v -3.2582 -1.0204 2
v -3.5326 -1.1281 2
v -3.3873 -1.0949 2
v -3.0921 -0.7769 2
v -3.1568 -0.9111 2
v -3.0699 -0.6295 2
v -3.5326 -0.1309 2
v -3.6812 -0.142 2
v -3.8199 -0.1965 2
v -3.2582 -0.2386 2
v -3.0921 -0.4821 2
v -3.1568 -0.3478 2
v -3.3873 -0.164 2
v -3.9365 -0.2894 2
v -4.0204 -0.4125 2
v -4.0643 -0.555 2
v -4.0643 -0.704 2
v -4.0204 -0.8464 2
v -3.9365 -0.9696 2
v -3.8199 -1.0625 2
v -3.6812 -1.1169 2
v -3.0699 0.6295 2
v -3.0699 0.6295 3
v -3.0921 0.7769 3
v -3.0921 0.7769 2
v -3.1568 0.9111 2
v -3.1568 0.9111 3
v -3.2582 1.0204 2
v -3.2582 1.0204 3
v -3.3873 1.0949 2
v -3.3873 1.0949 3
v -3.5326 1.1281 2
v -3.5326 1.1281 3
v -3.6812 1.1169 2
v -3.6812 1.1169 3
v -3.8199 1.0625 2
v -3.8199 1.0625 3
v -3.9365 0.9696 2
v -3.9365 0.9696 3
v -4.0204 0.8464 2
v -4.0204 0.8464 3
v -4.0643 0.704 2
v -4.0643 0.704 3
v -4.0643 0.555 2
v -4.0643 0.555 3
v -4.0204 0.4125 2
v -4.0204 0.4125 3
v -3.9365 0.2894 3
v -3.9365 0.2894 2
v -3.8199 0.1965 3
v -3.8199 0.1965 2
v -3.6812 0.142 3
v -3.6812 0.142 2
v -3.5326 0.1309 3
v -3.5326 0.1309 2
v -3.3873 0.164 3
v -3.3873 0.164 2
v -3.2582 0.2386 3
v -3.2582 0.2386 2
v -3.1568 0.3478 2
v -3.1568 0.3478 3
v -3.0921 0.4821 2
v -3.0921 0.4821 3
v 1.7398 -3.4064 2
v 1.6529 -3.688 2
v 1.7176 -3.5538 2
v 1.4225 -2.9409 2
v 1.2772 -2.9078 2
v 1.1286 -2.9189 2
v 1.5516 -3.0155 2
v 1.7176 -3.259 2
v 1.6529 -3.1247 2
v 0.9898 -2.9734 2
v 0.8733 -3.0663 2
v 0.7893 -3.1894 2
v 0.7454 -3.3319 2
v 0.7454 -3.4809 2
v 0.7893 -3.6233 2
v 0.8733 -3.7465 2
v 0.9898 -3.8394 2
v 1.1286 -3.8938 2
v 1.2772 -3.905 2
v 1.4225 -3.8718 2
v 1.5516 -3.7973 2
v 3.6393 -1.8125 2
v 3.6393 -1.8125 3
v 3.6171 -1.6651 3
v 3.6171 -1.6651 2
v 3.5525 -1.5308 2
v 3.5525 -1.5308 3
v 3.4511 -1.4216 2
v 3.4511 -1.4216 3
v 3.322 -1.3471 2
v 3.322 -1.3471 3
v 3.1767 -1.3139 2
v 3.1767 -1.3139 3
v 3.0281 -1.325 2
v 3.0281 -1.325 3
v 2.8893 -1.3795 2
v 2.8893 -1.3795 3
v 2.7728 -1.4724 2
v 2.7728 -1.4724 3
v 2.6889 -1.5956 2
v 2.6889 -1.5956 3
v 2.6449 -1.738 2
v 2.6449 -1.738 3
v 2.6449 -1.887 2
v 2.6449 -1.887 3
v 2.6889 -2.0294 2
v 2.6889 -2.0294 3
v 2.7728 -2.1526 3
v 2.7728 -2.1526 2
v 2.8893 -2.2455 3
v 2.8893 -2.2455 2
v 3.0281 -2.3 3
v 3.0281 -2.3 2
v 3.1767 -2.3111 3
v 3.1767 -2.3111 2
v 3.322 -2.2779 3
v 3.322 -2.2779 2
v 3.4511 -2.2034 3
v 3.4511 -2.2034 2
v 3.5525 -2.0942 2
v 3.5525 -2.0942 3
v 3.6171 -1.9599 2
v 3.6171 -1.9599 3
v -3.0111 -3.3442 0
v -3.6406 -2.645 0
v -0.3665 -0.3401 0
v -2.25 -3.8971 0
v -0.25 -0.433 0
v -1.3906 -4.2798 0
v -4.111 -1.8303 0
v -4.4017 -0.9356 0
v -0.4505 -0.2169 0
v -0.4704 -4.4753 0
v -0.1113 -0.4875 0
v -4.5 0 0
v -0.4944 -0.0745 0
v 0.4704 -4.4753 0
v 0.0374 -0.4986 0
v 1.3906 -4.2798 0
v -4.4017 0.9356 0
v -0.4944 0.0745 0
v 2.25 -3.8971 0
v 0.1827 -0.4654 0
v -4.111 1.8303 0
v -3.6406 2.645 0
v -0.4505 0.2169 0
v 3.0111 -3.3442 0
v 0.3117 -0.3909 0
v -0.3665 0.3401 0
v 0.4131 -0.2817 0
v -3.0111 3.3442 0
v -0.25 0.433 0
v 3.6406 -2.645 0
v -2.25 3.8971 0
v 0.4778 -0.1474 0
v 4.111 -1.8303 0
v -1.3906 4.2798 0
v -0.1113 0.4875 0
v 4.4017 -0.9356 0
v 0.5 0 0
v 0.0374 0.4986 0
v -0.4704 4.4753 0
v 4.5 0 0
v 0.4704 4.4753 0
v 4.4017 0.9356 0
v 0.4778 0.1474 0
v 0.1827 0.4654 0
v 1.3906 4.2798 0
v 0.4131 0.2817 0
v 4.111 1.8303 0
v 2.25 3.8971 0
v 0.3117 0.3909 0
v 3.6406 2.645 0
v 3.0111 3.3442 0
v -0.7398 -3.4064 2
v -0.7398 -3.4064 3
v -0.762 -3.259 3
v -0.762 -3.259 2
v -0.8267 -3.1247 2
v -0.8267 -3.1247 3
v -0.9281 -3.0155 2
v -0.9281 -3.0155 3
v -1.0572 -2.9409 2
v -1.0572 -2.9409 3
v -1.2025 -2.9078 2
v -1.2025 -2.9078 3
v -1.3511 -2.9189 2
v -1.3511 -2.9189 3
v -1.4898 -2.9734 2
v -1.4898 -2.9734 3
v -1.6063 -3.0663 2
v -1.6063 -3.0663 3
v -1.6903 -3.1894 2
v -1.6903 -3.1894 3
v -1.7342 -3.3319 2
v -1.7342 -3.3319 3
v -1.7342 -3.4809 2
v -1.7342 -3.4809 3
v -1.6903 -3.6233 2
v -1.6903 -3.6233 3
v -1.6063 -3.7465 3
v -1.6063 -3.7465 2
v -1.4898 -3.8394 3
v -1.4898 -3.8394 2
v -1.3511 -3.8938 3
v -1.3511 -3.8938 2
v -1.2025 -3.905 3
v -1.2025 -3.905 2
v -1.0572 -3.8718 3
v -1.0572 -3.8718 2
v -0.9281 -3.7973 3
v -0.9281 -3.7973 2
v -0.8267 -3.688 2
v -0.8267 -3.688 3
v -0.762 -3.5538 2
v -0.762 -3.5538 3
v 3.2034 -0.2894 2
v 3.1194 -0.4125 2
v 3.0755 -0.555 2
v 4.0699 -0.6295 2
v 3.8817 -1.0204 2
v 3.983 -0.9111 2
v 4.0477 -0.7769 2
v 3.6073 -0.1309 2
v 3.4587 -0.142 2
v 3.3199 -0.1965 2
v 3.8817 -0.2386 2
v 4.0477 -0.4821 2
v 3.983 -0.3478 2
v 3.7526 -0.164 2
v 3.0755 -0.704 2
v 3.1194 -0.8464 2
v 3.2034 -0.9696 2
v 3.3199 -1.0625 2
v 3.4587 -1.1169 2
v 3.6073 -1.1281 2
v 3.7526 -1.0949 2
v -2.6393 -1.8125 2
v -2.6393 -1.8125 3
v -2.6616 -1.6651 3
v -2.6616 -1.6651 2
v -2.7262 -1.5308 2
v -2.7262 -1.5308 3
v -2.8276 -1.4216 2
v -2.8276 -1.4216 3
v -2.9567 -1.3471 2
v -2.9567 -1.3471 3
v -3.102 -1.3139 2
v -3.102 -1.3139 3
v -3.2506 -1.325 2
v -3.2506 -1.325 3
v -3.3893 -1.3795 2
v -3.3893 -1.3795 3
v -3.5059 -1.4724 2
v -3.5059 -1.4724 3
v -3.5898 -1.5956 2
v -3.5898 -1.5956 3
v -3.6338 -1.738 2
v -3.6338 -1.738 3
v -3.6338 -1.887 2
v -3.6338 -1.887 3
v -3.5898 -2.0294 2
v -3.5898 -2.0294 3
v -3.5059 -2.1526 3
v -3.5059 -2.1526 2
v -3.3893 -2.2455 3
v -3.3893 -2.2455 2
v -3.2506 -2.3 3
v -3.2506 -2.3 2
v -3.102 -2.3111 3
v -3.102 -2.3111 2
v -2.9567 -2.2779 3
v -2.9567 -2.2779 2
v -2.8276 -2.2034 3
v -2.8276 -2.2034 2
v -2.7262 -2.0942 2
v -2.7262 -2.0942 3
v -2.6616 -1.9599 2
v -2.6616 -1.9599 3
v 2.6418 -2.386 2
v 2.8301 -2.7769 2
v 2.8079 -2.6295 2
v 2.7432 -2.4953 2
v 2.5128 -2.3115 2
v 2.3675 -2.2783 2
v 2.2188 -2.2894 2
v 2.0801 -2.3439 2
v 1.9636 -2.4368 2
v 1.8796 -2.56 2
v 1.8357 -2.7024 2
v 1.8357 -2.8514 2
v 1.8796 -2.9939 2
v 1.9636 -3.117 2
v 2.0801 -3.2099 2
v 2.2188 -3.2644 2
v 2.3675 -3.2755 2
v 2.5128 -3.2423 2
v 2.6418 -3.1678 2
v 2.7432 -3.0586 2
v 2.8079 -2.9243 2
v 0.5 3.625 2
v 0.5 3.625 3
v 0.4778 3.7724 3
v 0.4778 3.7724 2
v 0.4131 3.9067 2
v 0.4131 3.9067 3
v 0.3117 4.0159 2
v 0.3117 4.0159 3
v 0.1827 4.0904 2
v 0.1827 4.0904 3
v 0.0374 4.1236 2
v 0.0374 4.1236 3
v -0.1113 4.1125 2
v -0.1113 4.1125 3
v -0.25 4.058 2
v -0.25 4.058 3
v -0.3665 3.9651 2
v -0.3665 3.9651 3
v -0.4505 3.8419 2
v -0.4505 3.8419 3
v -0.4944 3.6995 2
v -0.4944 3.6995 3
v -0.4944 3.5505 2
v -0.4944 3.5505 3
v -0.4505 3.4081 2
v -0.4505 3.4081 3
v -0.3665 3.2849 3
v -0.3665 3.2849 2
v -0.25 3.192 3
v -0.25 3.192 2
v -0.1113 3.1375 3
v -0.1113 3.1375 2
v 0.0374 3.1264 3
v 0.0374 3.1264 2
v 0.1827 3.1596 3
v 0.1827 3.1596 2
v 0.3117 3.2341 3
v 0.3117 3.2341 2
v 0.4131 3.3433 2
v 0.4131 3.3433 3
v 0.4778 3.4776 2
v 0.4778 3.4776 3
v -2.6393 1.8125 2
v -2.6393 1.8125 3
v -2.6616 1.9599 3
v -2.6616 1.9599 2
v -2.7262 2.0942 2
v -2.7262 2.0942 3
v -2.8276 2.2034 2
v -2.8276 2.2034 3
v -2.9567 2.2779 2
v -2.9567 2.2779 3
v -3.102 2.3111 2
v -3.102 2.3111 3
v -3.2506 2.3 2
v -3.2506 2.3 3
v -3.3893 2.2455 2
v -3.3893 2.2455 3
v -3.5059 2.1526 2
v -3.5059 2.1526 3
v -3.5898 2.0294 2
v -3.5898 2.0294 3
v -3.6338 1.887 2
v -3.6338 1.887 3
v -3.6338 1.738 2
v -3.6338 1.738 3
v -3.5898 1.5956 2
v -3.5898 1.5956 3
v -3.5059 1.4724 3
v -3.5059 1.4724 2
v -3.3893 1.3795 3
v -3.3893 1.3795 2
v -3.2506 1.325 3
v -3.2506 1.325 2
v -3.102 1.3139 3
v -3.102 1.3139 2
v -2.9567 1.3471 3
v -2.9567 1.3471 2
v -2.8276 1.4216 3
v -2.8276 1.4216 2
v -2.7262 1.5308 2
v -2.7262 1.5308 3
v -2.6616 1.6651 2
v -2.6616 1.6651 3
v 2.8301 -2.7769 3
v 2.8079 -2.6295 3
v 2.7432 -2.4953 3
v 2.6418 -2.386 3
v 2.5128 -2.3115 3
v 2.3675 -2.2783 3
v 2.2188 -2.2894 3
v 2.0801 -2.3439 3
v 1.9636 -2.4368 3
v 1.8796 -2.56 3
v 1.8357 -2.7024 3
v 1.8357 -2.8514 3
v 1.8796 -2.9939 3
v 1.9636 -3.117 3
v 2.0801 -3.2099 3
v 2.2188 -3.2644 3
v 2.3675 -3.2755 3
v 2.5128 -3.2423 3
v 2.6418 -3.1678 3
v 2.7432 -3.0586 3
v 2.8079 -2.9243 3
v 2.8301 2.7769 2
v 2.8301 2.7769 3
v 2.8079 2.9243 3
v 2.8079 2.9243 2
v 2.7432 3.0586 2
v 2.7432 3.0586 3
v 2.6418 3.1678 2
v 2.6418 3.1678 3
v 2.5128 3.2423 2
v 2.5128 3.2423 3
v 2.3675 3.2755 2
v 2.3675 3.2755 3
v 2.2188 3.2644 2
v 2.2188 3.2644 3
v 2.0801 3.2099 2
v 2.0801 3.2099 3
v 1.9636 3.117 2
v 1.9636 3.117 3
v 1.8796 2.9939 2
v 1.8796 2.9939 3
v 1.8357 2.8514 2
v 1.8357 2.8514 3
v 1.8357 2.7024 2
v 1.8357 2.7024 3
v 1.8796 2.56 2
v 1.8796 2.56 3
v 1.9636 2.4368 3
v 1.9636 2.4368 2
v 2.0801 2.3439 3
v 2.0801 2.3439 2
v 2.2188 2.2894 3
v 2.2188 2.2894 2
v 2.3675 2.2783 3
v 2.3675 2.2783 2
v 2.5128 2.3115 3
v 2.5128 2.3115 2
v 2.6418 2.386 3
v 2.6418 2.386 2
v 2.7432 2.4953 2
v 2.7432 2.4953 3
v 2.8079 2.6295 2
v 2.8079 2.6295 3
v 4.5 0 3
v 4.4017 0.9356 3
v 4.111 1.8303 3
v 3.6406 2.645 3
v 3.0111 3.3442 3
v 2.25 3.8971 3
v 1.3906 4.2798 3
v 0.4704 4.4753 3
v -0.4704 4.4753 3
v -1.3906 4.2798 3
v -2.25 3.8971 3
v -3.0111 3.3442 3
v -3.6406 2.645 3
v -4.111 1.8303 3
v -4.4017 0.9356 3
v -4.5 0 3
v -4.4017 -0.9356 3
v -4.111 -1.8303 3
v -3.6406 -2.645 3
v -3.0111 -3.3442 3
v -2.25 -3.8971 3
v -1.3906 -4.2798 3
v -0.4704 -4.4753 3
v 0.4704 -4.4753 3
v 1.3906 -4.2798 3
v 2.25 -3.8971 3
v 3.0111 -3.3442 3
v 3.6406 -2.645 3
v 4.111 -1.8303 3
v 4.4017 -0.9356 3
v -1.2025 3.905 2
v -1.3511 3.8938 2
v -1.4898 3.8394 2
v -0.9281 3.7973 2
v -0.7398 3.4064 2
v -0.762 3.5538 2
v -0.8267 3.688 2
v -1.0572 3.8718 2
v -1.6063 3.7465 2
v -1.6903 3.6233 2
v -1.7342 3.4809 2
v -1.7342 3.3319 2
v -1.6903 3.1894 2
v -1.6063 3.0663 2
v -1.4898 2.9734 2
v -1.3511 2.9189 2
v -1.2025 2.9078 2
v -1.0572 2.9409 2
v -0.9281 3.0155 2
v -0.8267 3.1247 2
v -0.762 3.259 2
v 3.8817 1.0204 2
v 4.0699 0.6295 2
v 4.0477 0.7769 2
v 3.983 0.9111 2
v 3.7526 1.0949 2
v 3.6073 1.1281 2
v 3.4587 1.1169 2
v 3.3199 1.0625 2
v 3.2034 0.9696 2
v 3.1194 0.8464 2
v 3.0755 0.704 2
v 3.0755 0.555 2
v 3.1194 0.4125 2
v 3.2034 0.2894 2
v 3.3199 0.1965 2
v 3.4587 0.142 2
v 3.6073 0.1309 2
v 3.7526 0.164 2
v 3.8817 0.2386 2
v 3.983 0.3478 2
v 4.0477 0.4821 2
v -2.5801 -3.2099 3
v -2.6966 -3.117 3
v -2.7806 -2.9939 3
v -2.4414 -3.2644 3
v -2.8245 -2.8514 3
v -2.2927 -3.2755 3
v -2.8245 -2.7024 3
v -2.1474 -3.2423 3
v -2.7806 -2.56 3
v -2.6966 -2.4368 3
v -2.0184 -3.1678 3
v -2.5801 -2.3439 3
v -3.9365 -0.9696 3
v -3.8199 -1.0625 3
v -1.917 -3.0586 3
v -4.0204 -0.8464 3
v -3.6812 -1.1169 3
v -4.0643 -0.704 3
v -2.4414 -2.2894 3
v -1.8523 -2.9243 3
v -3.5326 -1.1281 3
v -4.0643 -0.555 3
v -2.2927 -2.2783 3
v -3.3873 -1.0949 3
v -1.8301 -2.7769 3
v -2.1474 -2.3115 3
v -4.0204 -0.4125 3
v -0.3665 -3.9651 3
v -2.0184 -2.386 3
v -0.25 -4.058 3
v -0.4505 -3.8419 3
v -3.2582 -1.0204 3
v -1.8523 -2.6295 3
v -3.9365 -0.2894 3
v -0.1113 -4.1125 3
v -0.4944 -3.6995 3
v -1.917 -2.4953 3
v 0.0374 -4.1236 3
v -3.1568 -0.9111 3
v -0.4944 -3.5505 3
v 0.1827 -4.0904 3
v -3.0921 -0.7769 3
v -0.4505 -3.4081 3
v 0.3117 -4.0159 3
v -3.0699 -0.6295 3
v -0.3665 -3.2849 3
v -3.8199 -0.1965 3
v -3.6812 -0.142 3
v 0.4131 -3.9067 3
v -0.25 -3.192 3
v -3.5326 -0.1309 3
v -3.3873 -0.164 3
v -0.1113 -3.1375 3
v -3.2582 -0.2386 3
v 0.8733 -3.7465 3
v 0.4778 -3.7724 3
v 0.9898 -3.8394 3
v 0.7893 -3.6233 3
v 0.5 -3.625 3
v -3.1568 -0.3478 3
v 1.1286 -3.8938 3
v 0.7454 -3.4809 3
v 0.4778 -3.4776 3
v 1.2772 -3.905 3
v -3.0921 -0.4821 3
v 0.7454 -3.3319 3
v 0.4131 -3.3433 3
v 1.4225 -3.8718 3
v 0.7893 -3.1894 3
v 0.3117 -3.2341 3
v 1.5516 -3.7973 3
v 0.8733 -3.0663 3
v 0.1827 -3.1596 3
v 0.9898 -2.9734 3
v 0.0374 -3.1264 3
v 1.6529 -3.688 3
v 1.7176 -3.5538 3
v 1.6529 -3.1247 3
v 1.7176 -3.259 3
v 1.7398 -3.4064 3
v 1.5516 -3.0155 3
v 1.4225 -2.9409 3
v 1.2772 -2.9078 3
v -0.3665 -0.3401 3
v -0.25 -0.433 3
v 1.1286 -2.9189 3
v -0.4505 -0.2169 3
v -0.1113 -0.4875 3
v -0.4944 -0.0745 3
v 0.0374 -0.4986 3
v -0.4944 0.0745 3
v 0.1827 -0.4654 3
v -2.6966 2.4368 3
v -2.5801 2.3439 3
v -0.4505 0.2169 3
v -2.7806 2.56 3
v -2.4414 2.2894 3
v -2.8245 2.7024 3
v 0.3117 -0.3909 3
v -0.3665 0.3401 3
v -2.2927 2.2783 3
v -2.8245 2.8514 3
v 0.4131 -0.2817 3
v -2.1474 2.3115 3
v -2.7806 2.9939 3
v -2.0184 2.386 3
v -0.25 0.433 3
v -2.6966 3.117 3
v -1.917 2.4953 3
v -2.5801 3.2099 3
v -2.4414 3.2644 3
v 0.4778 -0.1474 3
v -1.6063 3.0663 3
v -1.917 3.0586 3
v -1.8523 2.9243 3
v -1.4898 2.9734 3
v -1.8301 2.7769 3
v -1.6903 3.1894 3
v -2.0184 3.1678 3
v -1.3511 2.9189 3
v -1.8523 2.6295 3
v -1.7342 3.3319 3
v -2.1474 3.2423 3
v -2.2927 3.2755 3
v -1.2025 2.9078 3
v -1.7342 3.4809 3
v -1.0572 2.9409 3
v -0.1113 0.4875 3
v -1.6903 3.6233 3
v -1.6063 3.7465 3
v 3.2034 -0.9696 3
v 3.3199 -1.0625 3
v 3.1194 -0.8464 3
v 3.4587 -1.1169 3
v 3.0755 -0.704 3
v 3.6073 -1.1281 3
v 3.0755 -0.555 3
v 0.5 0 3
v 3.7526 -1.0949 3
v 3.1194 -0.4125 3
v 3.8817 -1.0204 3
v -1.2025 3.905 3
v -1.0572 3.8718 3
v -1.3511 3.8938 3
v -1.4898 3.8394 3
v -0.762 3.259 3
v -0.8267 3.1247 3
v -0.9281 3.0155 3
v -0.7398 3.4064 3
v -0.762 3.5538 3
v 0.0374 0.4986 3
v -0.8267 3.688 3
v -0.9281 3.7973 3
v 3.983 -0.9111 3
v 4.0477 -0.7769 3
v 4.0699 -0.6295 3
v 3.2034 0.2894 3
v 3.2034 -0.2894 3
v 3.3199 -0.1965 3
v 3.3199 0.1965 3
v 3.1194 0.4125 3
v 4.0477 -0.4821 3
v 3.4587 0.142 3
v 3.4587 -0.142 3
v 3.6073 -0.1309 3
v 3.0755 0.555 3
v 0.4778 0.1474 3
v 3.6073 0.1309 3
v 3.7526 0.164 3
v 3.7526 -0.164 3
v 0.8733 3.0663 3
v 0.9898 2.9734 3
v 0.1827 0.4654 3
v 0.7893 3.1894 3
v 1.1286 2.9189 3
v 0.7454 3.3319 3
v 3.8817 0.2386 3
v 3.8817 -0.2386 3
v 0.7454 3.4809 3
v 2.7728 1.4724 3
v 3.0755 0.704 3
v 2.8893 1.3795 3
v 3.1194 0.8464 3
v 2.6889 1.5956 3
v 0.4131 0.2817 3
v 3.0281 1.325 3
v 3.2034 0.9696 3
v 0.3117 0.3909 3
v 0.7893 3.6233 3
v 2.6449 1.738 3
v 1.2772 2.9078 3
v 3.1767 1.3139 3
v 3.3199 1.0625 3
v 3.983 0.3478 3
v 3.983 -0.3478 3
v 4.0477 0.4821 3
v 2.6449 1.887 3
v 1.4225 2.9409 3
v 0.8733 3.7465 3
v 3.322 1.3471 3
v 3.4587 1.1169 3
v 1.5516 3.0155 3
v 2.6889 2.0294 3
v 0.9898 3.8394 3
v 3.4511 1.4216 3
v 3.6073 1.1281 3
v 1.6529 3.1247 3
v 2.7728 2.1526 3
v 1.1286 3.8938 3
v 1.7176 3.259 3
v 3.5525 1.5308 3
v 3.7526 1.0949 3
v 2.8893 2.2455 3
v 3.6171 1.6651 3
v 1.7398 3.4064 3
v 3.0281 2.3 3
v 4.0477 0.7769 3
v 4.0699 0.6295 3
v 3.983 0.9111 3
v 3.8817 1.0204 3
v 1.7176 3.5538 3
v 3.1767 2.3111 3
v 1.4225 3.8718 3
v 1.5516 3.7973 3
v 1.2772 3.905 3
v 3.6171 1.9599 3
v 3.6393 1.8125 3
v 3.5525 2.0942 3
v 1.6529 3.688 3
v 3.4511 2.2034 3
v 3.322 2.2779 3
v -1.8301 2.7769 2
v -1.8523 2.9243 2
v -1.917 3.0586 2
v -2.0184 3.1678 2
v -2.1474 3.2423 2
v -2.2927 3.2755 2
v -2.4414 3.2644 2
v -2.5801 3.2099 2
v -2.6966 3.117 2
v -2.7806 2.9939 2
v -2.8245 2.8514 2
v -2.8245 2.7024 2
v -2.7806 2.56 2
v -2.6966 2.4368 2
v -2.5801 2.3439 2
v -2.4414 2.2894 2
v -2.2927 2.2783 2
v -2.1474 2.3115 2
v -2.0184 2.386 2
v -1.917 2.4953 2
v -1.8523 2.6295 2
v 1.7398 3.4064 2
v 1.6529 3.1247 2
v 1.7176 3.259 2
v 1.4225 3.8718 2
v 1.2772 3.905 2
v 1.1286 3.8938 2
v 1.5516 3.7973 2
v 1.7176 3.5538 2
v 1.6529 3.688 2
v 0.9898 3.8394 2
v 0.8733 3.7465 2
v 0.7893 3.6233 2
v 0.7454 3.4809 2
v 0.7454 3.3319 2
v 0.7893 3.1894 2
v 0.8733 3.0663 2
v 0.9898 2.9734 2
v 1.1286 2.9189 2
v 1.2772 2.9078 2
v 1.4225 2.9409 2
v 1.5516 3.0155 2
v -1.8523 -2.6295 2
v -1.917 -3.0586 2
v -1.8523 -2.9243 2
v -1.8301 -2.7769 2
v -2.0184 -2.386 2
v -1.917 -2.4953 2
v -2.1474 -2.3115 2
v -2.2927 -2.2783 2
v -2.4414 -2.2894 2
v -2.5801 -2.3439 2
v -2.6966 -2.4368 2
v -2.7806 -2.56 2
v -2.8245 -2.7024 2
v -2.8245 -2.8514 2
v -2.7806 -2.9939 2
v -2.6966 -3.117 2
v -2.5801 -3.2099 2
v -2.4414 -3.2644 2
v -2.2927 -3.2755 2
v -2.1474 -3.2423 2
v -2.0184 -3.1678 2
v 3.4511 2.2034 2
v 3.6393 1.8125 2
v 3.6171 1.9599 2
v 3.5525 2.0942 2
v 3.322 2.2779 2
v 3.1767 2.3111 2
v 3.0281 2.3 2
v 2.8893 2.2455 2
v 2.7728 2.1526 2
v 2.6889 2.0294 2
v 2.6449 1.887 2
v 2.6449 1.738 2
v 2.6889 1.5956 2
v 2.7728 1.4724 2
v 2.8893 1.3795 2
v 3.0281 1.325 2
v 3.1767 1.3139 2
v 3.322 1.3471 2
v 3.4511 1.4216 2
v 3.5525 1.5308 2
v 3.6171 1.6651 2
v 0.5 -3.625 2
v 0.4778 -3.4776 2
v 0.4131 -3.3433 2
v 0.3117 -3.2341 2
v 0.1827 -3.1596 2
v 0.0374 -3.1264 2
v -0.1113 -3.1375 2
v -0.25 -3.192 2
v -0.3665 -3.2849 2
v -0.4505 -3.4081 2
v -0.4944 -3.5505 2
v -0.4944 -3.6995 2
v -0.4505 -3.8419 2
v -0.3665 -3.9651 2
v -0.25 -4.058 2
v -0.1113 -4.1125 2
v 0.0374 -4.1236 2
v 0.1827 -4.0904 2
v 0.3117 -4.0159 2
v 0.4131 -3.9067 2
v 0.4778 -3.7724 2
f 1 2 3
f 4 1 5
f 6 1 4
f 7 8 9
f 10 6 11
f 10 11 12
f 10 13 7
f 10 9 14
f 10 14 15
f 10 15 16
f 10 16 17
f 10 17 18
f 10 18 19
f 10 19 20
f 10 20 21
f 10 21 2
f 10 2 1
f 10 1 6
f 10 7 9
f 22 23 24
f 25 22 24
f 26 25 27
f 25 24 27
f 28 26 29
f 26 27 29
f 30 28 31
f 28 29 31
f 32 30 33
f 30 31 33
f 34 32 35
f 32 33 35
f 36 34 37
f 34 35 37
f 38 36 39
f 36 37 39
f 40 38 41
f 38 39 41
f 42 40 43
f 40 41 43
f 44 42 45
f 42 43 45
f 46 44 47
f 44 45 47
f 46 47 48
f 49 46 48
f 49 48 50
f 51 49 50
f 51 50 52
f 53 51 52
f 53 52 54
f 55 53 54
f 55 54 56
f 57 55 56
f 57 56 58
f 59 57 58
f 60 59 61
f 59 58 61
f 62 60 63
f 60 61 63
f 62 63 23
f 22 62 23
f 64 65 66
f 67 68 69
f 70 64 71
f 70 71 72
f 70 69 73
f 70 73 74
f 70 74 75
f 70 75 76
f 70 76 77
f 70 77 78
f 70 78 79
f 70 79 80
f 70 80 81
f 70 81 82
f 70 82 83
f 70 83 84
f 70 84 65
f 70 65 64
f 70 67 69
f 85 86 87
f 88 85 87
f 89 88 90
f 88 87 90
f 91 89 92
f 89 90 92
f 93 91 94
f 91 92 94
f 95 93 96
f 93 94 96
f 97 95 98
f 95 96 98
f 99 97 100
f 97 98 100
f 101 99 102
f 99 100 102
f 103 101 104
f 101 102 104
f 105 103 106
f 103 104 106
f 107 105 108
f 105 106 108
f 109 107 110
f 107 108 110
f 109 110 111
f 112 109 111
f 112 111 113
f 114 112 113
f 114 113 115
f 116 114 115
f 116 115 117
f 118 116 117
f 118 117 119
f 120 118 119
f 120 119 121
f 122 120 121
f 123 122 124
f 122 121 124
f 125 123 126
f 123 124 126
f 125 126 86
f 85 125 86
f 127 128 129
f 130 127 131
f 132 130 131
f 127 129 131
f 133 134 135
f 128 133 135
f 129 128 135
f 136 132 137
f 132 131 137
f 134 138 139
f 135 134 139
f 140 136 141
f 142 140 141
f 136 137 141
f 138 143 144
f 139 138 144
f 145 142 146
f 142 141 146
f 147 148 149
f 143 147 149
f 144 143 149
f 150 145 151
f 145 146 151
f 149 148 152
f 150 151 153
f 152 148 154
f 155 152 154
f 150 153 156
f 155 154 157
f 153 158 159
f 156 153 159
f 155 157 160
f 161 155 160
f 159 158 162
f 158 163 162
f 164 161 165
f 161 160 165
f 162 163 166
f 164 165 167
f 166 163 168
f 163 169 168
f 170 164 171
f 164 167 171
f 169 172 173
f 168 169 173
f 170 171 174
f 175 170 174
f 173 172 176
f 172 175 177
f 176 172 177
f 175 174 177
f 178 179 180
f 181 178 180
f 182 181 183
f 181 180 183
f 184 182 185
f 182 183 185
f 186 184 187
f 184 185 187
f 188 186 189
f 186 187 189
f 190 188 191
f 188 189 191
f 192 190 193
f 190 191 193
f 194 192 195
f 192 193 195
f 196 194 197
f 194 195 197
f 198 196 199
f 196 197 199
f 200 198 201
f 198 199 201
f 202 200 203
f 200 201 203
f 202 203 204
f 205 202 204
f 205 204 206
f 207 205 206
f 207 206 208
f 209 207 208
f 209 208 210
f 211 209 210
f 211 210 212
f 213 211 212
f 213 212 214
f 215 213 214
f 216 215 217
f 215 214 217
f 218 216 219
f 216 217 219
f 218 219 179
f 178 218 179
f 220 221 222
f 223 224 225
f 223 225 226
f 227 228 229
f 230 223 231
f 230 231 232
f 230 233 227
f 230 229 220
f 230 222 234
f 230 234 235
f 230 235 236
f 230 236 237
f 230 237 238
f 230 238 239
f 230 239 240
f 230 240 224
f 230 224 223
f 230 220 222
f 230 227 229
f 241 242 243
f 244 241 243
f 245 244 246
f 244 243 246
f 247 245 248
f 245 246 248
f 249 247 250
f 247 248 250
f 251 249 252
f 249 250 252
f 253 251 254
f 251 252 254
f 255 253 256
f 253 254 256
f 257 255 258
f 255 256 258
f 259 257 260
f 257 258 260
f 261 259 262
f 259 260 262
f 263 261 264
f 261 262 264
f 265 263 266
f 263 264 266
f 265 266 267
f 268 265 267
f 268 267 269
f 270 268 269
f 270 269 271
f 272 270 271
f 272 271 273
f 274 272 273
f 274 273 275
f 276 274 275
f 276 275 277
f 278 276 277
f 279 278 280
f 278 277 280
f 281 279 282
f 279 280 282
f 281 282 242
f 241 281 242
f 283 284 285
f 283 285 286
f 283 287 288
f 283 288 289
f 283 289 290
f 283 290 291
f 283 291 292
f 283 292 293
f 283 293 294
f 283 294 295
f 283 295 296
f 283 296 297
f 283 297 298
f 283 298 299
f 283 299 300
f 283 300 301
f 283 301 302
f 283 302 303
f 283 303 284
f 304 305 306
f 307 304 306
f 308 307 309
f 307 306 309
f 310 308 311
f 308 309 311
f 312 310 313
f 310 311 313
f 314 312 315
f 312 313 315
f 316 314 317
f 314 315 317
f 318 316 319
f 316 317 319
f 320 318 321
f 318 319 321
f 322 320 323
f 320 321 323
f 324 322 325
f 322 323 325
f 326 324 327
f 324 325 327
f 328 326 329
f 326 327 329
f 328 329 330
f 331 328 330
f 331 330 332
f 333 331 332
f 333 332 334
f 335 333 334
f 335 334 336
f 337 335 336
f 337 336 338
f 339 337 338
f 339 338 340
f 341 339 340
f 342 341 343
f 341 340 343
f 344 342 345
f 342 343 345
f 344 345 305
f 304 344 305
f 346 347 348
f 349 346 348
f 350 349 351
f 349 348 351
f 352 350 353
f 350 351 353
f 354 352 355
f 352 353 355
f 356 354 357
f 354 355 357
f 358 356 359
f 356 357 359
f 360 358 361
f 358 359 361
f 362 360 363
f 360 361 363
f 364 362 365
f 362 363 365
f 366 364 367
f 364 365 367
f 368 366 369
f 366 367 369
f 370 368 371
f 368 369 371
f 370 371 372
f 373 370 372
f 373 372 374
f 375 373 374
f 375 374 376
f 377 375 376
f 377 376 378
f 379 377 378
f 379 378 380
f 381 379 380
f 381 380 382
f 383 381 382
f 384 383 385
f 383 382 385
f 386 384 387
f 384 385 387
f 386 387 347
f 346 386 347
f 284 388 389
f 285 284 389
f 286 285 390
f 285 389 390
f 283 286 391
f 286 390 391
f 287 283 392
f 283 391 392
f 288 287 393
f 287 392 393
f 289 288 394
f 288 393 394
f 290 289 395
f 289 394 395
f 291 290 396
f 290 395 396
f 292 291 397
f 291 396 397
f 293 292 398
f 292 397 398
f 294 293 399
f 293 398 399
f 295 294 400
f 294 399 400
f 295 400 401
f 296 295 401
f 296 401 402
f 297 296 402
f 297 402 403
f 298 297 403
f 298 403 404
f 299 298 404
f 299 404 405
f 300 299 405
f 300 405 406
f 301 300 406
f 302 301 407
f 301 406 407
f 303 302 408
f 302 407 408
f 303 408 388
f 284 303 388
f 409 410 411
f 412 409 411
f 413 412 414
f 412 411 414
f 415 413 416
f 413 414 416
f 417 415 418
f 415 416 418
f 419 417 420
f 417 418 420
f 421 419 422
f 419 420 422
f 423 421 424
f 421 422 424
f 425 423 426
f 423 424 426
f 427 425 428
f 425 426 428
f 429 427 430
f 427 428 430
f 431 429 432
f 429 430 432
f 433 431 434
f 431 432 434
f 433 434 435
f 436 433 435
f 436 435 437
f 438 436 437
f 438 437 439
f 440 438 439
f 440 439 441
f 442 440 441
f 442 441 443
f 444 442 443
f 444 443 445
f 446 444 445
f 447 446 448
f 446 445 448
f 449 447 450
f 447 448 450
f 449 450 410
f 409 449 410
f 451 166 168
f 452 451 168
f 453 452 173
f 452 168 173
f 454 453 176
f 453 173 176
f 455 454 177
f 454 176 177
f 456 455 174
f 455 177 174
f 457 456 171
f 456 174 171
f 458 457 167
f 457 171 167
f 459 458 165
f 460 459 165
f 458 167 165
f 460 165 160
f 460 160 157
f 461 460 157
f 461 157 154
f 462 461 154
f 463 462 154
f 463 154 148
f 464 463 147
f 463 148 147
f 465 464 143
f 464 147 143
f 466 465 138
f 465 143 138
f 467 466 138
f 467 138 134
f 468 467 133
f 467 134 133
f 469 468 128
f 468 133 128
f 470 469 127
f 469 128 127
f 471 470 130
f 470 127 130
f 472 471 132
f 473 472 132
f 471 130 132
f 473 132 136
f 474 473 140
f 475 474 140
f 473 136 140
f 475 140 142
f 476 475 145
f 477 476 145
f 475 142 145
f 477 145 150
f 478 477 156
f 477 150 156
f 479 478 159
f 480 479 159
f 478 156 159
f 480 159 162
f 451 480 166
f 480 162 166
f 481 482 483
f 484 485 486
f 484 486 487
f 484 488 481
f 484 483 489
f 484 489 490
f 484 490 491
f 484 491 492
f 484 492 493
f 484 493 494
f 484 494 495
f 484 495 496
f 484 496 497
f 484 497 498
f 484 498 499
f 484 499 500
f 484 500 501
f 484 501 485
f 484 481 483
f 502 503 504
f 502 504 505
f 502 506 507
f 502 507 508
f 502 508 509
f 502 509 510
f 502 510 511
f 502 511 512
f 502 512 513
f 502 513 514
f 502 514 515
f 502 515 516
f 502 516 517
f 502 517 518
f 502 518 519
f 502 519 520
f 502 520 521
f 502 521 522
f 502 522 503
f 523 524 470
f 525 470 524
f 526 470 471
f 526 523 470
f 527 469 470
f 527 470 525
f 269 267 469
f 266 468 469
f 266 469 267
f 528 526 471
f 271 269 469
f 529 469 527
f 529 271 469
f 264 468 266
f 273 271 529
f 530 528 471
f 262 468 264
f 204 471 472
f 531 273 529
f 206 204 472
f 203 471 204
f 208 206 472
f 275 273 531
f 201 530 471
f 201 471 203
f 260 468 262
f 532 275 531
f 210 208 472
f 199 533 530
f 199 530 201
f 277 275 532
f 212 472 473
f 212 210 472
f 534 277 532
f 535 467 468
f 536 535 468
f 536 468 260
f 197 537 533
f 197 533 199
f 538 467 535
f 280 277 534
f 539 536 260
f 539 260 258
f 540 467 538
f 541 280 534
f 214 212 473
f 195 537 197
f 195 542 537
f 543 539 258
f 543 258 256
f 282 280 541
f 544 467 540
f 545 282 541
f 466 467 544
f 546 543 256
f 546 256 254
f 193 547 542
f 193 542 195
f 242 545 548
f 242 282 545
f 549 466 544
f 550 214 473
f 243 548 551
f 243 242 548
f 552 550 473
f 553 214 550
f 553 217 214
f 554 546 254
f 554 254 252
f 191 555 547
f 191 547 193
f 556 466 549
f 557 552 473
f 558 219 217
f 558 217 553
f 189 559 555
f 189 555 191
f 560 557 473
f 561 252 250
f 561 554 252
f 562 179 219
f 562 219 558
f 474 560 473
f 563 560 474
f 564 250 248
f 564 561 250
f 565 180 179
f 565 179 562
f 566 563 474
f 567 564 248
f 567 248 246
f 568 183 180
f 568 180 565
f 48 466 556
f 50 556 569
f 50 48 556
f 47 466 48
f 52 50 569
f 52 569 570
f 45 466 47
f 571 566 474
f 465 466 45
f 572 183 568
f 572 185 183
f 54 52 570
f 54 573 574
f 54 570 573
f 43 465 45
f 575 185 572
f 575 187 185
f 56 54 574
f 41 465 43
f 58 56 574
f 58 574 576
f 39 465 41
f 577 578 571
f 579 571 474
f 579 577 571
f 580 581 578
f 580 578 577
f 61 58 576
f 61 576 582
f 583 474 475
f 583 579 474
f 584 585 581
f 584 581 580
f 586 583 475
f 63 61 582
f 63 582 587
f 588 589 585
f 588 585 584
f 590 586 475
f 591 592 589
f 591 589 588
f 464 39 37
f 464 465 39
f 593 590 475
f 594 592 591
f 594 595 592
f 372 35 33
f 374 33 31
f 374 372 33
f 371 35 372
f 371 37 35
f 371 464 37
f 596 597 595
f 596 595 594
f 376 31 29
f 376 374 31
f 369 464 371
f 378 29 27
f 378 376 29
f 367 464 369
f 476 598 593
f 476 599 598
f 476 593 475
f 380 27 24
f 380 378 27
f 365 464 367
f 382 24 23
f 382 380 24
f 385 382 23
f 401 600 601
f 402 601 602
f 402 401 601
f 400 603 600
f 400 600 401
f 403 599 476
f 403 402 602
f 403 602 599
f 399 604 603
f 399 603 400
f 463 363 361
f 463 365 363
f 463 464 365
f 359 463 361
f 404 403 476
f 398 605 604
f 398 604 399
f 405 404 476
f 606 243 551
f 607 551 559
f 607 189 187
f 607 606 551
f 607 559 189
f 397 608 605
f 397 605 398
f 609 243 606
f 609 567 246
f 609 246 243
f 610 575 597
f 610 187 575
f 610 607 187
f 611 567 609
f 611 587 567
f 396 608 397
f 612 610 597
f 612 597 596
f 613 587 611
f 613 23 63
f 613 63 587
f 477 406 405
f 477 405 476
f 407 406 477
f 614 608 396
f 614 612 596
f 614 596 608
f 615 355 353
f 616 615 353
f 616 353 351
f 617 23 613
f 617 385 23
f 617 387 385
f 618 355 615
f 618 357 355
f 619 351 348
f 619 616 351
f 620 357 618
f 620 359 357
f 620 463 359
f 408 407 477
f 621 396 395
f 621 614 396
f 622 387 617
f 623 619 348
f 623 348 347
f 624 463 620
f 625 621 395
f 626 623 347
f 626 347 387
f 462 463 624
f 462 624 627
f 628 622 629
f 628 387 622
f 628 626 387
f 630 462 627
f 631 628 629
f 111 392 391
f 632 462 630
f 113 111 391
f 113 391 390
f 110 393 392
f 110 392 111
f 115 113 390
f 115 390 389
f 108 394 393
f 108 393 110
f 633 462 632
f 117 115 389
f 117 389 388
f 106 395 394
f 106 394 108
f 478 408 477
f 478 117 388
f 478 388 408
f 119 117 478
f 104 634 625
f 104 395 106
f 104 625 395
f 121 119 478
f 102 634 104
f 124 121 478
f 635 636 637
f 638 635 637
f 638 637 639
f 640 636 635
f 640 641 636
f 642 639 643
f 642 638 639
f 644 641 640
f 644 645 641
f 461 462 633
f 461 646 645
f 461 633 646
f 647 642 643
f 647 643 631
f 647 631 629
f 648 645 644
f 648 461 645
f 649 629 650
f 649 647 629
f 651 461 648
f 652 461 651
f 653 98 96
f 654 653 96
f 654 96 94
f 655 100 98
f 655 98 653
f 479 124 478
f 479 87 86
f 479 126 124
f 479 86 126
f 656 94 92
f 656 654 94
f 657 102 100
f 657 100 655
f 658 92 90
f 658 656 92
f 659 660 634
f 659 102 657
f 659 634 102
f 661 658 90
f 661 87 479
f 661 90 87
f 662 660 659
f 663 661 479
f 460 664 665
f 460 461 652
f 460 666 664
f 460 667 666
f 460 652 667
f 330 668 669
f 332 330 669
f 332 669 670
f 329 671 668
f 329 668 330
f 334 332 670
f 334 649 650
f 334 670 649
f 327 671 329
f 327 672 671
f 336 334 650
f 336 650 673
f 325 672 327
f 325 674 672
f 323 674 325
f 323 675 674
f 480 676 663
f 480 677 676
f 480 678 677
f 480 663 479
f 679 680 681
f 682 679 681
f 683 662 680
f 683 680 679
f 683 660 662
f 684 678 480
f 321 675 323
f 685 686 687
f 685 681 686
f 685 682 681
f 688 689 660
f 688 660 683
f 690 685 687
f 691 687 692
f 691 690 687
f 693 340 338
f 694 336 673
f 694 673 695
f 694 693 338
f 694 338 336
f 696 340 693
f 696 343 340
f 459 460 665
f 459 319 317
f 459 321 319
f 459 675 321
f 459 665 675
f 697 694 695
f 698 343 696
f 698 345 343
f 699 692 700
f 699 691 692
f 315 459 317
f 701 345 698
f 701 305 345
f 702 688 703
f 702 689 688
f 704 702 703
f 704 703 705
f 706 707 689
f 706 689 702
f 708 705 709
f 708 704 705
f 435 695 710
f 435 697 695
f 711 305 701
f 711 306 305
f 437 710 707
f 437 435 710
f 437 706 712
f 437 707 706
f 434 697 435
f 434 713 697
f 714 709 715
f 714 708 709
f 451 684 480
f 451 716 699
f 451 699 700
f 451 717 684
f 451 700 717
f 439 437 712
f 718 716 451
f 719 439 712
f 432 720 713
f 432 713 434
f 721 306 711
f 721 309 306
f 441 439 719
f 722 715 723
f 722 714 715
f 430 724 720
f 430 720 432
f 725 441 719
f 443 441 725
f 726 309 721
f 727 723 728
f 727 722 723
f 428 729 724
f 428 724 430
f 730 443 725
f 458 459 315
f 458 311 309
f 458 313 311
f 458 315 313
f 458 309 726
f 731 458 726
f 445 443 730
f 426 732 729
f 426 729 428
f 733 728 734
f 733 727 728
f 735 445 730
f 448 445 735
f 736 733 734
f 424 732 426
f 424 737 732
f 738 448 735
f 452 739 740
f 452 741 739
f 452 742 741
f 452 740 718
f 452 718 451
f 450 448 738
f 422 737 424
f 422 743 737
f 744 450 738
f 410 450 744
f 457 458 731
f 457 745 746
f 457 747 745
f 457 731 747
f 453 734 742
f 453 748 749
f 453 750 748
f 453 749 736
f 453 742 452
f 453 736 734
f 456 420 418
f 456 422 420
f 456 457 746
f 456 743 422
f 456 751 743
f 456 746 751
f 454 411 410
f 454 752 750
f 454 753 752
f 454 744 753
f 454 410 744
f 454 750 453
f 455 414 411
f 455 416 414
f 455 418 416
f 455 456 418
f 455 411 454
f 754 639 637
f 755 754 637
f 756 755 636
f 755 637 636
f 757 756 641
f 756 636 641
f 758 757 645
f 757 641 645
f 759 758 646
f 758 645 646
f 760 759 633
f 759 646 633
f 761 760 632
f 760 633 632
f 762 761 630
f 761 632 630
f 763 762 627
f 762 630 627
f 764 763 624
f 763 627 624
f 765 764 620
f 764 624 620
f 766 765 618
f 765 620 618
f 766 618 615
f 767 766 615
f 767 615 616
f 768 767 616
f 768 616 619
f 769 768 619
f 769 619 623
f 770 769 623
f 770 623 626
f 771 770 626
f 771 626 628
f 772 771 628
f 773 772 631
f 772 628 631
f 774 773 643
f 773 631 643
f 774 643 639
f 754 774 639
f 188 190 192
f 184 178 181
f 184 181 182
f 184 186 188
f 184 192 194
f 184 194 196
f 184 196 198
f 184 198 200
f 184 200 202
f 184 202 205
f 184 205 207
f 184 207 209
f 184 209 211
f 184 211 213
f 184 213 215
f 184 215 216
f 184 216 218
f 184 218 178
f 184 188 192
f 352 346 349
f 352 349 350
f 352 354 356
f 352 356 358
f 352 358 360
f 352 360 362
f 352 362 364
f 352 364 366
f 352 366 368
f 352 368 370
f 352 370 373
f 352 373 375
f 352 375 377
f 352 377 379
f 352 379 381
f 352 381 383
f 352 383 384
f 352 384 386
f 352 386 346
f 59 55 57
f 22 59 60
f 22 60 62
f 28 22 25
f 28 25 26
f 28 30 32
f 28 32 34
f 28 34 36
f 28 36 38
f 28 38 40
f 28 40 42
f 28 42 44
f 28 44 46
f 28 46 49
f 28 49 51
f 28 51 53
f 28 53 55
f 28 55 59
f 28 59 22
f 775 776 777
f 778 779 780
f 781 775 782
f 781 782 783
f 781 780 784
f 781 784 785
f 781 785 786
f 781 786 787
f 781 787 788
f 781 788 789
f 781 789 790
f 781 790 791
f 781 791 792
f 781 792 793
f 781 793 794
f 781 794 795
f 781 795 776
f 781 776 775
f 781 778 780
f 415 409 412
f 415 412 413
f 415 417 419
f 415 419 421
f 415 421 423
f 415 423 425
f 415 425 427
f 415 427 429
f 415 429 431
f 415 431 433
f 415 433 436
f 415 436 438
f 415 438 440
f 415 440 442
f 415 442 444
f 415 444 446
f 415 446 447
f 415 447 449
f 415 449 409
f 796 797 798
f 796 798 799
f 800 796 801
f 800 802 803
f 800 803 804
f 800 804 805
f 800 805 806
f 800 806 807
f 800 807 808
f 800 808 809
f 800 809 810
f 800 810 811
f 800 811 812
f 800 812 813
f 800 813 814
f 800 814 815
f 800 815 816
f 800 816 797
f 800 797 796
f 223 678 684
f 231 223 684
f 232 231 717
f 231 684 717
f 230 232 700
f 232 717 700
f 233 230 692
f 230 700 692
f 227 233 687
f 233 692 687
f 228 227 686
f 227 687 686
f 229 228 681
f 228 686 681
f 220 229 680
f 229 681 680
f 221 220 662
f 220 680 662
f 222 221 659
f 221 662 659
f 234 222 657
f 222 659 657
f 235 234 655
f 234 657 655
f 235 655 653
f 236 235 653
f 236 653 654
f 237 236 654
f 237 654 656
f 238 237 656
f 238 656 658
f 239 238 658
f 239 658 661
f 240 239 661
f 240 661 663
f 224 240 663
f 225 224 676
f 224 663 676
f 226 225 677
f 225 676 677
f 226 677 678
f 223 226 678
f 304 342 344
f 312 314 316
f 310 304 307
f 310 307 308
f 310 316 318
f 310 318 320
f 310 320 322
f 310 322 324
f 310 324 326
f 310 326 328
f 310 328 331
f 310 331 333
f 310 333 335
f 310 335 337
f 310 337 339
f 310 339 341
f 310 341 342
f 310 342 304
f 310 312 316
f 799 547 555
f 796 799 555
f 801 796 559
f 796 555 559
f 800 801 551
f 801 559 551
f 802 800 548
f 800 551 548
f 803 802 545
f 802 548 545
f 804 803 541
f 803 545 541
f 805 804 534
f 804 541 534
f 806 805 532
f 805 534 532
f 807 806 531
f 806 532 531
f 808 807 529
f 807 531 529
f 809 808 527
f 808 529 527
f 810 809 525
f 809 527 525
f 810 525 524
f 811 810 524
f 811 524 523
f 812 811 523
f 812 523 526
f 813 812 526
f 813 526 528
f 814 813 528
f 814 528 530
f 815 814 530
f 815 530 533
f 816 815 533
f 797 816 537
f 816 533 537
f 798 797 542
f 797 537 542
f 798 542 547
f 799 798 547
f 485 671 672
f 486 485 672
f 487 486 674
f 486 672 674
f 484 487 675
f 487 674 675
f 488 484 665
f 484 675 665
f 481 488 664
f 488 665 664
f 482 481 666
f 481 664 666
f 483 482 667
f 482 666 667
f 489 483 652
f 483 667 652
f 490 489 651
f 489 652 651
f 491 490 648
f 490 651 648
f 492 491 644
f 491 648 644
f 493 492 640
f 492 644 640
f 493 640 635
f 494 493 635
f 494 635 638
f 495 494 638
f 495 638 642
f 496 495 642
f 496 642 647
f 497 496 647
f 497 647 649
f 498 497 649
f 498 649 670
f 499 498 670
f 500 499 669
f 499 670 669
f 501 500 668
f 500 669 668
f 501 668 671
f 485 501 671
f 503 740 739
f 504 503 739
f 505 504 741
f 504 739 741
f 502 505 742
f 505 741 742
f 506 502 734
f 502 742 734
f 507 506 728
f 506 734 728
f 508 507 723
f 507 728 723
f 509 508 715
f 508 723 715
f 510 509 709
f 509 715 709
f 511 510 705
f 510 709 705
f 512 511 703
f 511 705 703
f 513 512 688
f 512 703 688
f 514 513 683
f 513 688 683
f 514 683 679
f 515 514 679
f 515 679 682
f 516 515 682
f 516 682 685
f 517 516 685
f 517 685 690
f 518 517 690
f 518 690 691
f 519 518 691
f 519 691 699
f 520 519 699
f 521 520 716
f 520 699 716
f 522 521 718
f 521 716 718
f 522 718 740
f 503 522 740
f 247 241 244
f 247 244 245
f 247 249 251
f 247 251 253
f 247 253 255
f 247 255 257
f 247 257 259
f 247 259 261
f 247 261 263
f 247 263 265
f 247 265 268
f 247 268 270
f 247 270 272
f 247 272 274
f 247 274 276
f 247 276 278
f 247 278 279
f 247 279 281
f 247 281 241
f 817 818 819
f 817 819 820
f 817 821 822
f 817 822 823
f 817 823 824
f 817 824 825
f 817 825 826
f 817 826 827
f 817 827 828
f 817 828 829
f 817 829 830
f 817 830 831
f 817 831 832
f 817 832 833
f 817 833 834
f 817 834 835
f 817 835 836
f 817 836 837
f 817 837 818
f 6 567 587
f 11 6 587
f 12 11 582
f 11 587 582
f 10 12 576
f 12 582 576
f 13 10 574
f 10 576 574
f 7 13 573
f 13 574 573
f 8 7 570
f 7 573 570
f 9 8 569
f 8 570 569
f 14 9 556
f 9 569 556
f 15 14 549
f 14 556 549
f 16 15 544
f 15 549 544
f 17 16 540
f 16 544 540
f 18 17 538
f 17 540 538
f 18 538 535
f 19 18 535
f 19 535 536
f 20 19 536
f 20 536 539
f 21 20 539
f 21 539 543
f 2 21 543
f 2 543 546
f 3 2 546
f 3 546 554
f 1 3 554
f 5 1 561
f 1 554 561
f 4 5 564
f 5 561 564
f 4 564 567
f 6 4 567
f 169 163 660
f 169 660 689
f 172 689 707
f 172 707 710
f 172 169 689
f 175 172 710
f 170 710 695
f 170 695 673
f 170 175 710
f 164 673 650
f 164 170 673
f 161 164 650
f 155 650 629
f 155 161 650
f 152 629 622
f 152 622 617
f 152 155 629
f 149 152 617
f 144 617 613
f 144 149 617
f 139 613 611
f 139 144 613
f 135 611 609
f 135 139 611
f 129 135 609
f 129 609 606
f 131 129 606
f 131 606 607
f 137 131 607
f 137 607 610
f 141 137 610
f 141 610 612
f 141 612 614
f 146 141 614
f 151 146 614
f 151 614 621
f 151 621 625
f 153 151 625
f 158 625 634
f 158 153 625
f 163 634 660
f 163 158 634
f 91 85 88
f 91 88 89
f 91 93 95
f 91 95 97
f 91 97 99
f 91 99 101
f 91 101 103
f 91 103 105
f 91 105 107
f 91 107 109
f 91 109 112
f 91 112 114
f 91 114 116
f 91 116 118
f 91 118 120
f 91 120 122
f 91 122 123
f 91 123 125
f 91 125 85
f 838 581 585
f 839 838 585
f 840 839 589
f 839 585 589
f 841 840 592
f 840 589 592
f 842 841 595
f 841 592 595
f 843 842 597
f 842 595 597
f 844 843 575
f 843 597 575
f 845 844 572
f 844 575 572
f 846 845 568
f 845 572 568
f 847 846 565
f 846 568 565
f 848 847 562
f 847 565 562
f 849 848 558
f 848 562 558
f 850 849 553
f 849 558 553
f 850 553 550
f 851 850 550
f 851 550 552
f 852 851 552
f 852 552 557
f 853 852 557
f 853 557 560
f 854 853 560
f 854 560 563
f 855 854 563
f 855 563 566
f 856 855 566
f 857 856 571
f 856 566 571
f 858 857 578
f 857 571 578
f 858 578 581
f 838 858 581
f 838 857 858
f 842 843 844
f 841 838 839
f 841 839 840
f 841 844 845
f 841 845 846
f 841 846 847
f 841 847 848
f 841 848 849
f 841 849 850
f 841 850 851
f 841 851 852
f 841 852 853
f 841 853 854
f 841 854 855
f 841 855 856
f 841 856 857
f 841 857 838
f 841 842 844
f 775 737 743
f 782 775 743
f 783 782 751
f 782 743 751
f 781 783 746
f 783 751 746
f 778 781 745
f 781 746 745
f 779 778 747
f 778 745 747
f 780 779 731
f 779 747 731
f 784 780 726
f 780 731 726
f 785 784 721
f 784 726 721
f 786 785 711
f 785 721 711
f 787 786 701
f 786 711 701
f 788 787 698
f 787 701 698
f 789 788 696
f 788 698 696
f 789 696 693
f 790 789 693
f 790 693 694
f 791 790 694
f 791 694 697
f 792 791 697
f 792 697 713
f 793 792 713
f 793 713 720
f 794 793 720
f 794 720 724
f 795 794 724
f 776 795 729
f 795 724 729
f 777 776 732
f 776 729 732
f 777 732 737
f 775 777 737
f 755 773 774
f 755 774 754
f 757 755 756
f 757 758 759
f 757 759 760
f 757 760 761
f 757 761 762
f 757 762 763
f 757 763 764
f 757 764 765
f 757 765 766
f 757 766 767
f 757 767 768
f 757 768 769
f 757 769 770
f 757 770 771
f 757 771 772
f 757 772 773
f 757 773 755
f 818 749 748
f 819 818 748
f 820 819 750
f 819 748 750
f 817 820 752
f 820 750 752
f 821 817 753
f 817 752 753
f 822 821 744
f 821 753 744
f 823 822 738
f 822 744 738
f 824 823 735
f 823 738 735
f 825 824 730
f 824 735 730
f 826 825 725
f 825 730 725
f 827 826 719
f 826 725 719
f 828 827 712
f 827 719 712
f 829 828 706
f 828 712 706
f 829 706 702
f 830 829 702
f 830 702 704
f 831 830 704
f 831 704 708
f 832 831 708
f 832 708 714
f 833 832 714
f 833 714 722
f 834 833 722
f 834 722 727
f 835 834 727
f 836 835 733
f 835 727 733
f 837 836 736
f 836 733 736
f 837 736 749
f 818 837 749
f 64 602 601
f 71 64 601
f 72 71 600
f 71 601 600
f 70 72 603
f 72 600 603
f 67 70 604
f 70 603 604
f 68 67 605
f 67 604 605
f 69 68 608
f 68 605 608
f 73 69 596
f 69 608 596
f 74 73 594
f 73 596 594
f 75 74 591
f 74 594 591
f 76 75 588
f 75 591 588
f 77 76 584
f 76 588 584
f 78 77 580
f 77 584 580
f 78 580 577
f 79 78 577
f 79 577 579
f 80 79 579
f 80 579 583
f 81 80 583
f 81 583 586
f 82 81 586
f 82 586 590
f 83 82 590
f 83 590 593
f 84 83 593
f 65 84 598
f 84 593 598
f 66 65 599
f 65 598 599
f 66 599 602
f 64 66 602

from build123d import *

# Parameters (mm, degrees)
SZKIC1_R                    = 4.5
SZKIC1_R_2                  = 0.5
DODANIE_WYCI_GNI_CIE1_DEPTH = 3
SZKIC2_R                    = 0.5
WYTNIJ_WYCI_GNI_CIE2_DEPTH  = 1


with BuildPart() as part:
    # Szkic1 → Dodanie-wyciągnięcie1 (new body)
    with BuildSketch(Plane.XY):
        Circle(SZKIC1_R)
        Circle(SZKIC1_R_2, mode=Mode.SUBTRACT)
    extrude(amount=DODANIE_WYCI_GNI_CIE1_DEPTH)

    # Szkic2 → Wytnij-wyciągnięcie2 (cut)
    with BuildSketch(Plane.XY.offset(3)):
        with Locations((0, 3.625)):
            Circle(SZKIC2_R)
        with Locations((1.23982302, 3.40638575)):
            Circle(SZKIC2_R)
        with Locations((2.330105085, 2.776911106)):
            Circle(SZKIC2_R)
        with Locations((3.139342089, 1.8125)):
            Circle(SZKIC2_R)
        with Locations((3.569928105, 0.629474644)):
            Circle(SZKIC2_R)
        with Locations((3.569928105, -0.629474644)):
            Circle(SZKIC2_R)
        with Locations((3.139342089, -1.8125)):
            Circle(SZKIC2_R)
        with Locations((2.330105085, -2.776911106)):
            Circle(SZKIC2_R)
        with Locations((1.23982302, -3.40638575)):
            Circle(SZKIC2_R)
        with Locations((0, -3.625)):
            Circle(SZKIC2_R)
        with Locations((-1.23982302, -3.40638575)):
            Circle(SZKIC2_R)
        with Locations((-2.330105085, -2.776911106)):
            Circle(SZKIC2_R)
        with Locations((-3.139342089, -1.8125)):
            Circle(SZKIC2_R)
        with Locations((-3.569928105, -0.629474644)):
            Circle(SZKIC2_R)
        with Locations((-3.569928105, 0.629474644)):
            Circle(SZKIC2_R)
        with Locations((-3.139342089, 1.8125)):
            Circle(SZKIC2_R)
        with Locations((-2.330105085, 2.776911106)):
            Circle(SZKIC2_R)
        with Locations((-1.23982302, 3.40638575)):
            Circle(SZKIC2_R)
    extrude(amount=-WYTNIJ_WYCI_GNI_CIE2_DEPTH, mode=Mode.SUBTRACT)


solid = part.part
